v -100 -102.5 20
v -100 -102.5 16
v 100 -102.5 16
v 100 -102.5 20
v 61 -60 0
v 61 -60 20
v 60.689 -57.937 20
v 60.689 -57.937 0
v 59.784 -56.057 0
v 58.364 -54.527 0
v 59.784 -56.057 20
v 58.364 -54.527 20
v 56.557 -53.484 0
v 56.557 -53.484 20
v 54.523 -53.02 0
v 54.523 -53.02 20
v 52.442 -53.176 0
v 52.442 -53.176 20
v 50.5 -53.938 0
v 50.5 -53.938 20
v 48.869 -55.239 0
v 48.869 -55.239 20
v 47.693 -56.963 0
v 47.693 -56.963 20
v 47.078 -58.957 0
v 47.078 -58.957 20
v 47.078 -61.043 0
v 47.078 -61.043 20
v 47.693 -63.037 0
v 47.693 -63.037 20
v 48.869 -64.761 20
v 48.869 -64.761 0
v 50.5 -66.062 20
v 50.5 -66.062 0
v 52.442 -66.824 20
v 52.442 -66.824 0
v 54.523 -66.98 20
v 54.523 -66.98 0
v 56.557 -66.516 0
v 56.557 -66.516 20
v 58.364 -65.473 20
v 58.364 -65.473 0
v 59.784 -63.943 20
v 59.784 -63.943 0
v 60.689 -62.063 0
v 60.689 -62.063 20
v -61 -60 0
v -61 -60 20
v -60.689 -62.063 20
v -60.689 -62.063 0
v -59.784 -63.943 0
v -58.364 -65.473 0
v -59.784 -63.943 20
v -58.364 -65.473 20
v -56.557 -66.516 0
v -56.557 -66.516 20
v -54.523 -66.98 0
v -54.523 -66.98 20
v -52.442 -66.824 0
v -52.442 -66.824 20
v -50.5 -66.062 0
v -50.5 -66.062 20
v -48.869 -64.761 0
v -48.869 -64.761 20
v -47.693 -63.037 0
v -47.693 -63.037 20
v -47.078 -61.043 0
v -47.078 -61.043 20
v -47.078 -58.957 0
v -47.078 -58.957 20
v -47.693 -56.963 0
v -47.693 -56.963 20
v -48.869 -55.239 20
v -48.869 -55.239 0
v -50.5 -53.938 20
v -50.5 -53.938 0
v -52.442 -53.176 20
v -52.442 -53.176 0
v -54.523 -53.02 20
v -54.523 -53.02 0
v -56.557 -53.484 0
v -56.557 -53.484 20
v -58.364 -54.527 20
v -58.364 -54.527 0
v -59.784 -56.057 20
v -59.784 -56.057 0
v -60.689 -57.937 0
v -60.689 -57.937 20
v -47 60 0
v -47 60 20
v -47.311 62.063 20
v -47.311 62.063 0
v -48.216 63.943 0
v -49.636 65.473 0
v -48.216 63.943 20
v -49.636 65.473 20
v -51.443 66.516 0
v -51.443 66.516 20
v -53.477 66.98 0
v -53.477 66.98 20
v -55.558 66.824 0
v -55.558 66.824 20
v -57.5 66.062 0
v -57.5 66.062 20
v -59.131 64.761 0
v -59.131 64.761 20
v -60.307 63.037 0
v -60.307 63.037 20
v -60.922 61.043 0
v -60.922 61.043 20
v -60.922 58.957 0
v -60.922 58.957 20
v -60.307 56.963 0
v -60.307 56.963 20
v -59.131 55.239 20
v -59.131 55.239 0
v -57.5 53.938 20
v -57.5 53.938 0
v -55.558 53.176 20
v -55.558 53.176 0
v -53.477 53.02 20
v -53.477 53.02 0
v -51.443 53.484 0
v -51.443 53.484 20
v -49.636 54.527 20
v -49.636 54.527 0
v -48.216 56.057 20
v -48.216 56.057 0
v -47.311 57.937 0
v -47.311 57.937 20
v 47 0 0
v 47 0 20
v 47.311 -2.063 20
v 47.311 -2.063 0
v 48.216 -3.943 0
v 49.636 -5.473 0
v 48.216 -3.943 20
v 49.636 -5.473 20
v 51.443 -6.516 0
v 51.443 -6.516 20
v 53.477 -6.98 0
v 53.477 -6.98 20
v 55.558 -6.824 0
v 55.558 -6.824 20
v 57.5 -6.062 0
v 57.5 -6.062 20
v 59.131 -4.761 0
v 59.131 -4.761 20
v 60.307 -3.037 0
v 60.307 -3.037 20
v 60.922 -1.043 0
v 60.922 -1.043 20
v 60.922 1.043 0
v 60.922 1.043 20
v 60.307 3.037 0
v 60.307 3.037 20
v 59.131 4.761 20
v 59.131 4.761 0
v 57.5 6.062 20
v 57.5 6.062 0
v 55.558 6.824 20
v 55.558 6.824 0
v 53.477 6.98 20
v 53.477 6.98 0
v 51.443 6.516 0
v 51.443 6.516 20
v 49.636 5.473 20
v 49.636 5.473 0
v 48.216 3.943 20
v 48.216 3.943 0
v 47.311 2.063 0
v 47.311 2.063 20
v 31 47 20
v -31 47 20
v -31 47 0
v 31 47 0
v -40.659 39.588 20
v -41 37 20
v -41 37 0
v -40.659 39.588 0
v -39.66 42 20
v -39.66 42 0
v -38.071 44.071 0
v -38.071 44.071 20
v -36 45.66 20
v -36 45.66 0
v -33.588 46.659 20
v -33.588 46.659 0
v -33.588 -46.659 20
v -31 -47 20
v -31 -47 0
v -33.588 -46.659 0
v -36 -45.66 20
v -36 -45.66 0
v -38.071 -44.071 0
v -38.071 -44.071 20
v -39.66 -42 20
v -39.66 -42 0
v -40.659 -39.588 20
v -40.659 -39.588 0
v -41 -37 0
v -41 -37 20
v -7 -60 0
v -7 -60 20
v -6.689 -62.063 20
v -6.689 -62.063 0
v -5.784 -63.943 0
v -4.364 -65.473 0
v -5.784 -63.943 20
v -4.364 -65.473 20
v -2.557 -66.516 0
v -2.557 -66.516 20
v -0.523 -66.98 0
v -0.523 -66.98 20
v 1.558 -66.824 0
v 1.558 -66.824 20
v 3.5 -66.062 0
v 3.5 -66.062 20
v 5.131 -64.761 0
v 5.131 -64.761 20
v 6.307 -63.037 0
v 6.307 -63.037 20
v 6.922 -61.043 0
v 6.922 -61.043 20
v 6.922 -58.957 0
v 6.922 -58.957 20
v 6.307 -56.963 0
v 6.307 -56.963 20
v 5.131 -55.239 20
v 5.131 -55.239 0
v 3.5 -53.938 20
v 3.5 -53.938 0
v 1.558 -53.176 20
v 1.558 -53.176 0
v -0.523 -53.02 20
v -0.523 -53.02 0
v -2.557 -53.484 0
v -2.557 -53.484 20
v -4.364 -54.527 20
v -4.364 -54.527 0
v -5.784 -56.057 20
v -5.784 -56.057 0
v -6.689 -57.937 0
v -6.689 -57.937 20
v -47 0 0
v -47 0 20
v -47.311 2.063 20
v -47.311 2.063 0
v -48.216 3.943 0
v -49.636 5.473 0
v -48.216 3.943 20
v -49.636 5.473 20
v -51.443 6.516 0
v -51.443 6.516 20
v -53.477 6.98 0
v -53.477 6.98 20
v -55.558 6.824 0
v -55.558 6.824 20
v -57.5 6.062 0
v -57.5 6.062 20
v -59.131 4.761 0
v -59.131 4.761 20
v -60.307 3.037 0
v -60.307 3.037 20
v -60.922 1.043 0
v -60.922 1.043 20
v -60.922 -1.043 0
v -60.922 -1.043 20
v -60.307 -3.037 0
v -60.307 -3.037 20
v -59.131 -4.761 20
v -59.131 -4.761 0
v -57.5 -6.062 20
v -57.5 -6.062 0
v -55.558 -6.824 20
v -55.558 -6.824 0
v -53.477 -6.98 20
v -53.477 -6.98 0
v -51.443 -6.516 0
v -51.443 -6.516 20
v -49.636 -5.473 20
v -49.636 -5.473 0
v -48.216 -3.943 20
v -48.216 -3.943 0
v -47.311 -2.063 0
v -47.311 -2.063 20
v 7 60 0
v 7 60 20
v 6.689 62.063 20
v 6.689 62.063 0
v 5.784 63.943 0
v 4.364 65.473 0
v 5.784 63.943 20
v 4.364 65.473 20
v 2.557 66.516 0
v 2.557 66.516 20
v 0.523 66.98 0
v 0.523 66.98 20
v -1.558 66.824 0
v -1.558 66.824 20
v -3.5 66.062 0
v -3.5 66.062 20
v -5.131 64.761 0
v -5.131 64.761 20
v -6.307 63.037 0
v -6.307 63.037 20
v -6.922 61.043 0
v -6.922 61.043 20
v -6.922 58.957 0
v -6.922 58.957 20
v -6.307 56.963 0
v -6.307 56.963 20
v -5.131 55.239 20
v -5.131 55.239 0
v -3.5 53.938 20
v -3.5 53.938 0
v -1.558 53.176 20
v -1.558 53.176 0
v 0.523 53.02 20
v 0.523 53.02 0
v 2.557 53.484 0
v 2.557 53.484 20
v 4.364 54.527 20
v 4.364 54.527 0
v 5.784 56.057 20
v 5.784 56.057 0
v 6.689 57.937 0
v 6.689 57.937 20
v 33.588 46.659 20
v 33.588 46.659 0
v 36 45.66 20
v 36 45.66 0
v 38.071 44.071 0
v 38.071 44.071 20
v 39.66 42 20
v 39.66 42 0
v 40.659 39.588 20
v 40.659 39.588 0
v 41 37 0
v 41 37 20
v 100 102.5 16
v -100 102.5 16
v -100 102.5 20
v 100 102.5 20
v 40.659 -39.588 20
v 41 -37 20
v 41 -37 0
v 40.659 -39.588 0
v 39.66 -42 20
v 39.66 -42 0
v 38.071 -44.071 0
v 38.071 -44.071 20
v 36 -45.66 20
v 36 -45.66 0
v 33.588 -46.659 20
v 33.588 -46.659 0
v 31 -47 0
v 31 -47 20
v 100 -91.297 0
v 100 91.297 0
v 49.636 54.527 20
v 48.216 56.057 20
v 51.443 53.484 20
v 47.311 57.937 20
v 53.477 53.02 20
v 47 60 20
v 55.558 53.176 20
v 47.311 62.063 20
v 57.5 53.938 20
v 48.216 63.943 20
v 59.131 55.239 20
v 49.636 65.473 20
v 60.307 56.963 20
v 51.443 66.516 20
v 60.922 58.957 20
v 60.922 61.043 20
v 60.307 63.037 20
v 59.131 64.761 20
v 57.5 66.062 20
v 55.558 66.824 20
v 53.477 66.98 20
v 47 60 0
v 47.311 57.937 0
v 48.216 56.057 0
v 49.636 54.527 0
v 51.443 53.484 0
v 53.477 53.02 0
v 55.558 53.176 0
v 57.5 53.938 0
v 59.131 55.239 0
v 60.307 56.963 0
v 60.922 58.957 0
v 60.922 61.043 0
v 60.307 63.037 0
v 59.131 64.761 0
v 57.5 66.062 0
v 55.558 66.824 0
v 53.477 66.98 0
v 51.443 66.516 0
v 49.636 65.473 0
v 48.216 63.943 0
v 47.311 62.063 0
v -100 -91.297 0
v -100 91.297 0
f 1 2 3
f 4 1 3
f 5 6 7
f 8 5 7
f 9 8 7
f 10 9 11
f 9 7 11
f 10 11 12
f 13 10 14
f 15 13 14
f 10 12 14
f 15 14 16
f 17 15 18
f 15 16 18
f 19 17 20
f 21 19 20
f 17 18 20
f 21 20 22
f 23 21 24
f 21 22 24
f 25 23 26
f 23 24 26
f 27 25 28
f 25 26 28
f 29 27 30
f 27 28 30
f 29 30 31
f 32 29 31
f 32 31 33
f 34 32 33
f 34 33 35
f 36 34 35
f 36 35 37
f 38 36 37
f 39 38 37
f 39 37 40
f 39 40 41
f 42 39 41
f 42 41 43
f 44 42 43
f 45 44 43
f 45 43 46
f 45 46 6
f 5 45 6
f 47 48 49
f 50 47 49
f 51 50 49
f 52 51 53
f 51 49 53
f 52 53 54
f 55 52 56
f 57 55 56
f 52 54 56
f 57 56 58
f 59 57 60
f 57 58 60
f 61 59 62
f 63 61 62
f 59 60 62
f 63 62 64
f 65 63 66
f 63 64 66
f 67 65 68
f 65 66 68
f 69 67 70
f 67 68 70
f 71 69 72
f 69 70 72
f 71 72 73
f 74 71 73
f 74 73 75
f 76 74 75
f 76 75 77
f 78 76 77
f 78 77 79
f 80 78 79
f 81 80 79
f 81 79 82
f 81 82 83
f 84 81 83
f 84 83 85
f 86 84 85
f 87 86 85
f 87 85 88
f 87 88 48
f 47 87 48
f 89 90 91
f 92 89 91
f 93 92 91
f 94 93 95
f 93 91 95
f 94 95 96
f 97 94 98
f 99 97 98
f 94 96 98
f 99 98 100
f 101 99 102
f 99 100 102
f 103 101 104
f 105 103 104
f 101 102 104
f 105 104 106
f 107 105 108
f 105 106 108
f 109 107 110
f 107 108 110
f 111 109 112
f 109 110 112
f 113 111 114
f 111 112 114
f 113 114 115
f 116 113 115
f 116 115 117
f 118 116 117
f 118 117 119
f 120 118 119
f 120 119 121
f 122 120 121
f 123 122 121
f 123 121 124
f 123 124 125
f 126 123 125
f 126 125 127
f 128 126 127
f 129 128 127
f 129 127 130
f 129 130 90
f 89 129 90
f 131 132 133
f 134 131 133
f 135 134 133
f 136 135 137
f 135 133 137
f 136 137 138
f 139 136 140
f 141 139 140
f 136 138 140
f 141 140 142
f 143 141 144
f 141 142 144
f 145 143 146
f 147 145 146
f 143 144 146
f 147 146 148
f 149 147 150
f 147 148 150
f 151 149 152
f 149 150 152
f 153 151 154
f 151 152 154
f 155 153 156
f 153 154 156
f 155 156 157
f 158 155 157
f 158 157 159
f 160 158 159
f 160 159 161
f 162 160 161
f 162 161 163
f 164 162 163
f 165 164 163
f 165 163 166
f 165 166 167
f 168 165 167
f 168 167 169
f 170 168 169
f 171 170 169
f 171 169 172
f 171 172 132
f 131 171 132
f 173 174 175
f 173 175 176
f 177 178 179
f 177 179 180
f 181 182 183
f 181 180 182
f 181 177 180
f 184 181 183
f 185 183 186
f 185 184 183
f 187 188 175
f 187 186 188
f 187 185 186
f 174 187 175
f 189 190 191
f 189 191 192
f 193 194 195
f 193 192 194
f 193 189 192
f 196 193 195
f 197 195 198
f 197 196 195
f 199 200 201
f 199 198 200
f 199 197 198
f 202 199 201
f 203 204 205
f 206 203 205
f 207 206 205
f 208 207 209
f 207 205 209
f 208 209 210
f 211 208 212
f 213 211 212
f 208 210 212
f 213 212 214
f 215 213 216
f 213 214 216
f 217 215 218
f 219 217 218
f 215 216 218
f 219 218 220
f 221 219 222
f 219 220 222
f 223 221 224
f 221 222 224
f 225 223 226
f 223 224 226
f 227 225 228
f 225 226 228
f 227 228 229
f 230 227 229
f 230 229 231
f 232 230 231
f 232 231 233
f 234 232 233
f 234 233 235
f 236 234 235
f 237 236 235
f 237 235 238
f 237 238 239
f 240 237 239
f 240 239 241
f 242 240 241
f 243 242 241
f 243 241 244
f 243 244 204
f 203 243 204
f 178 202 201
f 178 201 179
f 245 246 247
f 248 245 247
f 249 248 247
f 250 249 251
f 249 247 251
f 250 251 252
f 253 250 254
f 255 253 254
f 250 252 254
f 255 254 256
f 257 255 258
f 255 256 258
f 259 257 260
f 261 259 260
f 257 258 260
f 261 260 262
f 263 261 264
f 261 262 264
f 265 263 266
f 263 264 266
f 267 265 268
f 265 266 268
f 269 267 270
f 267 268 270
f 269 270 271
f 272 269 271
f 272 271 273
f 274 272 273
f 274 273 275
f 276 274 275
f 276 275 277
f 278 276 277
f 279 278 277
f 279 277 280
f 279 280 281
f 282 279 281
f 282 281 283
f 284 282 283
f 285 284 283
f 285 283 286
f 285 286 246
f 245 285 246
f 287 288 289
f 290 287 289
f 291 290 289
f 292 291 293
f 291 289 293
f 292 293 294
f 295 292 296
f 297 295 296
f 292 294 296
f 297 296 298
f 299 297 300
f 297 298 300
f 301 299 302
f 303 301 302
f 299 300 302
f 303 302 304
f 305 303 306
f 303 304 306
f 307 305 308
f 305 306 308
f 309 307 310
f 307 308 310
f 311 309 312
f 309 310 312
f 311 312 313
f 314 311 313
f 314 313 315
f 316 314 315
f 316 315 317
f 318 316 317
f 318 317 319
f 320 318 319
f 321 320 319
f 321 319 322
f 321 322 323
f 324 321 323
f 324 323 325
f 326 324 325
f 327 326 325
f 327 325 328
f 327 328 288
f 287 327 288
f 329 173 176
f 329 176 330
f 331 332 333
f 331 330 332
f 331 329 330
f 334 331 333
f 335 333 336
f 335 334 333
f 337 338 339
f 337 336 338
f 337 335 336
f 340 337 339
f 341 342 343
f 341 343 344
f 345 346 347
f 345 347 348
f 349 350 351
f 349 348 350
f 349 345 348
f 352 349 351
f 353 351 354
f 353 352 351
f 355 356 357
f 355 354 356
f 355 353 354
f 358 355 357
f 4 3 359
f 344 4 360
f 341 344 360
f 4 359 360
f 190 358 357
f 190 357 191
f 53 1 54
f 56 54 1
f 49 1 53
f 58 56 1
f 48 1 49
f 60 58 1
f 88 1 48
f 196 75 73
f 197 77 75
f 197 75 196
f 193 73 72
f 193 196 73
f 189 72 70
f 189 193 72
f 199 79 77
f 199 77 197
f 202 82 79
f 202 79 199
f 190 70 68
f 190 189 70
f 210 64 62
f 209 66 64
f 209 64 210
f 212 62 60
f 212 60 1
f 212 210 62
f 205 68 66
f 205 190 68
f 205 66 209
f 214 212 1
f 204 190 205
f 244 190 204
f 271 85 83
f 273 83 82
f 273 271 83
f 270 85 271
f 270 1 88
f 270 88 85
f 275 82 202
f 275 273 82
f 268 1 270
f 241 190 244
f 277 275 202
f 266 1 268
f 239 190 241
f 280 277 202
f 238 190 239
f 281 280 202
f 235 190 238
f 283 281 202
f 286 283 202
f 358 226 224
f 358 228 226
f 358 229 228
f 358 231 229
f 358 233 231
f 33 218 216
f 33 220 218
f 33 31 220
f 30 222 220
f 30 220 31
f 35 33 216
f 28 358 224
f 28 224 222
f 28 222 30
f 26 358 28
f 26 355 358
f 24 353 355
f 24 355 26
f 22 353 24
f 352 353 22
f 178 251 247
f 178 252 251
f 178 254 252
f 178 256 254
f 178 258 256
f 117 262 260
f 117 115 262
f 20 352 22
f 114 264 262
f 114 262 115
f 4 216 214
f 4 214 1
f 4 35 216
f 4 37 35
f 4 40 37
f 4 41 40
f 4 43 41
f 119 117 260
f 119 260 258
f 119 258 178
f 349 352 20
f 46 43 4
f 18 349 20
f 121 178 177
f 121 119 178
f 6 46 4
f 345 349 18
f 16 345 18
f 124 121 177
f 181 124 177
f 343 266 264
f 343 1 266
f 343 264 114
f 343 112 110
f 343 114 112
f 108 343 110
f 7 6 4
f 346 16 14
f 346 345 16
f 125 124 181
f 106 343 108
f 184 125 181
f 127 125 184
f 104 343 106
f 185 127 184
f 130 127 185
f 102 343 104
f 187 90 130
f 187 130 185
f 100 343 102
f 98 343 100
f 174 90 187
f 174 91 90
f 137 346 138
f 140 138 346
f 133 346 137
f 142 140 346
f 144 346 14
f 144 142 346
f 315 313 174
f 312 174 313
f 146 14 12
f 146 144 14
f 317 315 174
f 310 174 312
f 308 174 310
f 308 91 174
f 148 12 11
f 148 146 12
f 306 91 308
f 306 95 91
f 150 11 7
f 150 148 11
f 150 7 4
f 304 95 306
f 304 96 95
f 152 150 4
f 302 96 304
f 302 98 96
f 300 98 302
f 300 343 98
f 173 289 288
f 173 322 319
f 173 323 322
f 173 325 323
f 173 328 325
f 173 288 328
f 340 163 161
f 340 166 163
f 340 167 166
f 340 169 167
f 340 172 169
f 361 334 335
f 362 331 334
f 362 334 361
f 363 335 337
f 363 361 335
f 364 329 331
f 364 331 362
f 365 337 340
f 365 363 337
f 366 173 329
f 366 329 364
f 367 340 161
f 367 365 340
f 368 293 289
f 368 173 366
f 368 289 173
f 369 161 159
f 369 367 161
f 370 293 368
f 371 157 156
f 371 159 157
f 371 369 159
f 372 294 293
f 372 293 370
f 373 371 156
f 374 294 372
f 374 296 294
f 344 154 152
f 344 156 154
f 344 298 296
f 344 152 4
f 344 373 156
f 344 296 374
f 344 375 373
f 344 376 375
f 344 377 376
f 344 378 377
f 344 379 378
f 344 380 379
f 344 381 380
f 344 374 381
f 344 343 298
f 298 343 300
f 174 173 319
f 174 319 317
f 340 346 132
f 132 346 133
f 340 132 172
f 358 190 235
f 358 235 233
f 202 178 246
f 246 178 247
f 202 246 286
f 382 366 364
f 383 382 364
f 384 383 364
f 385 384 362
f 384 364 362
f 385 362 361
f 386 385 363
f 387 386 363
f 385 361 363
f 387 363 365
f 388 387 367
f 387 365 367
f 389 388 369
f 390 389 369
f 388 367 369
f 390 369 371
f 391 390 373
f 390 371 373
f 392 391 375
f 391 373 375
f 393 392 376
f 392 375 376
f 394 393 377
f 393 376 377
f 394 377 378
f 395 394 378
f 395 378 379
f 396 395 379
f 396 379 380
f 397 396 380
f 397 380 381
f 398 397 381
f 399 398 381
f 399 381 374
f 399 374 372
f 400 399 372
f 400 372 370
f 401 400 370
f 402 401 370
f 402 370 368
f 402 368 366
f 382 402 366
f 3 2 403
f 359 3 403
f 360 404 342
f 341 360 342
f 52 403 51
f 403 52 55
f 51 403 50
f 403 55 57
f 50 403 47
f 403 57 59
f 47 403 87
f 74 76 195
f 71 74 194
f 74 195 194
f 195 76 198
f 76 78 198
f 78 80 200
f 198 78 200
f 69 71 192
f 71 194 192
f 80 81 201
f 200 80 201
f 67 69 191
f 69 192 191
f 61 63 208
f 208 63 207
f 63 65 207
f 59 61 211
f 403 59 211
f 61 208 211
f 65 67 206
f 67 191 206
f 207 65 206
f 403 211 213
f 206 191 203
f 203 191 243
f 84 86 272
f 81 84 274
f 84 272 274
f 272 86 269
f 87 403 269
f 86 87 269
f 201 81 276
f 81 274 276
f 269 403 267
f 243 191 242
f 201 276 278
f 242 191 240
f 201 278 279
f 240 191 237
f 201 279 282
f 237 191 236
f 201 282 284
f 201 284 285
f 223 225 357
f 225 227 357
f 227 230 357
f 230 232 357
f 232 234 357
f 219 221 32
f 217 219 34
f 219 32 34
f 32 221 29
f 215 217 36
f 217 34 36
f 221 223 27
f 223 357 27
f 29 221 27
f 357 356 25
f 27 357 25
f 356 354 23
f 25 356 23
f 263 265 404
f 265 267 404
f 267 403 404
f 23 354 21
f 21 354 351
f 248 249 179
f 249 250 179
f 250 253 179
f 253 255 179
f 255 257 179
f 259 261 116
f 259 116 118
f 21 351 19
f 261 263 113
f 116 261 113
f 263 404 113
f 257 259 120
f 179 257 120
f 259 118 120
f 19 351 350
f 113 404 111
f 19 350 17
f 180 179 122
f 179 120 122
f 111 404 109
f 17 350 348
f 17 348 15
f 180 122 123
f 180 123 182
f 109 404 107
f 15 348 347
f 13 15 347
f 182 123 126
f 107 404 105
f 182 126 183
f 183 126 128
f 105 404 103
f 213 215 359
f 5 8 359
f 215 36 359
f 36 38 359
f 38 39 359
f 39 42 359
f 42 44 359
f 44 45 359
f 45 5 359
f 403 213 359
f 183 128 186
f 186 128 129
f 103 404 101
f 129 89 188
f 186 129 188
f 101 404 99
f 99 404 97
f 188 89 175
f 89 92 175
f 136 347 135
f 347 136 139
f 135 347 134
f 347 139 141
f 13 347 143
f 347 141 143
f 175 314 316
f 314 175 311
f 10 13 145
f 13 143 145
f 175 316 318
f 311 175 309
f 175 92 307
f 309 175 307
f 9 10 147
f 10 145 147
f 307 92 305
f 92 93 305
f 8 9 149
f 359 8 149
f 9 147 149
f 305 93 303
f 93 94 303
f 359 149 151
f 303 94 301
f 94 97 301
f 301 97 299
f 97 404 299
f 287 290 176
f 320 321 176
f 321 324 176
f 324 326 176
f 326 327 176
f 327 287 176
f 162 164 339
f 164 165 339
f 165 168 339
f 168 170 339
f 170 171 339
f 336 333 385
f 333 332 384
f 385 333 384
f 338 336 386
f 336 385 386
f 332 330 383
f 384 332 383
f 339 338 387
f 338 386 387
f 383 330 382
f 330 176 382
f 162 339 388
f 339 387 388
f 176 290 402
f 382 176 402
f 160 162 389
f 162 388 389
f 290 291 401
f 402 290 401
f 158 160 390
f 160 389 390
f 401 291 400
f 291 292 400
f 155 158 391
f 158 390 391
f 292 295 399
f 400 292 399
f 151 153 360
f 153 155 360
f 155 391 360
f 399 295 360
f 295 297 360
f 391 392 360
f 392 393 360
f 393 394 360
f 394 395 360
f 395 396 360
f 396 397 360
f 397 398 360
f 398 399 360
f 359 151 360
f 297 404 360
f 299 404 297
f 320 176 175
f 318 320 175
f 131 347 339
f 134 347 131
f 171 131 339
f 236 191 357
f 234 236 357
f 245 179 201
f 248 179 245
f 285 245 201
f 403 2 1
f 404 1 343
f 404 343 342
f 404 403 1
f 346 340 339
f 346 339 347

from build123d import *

# Parameters (mm, degrees)
SKETCH_1_W          = 200
SKETCH_1_H          = 205
EXTRUDE_1_DEPTH     = 20
SKETCH_2_R          = 7
CUT_EXTRUDE_1_DEPTH = 145.589937409
CUT_EXTRUDE_2_DEPTH = 226.624134347


with BuildPart() as part:
    # 草图1 → 凸台-拉伸1 (new body)
    with BuildSketch(Plane.XY):
        Rectangle(SKETCH_1_W, SKETCH_1_H)
    extrude(amount=EXTRUDE_1_DEPTH)

    # 草图2 → 切除-拉伸1 (cut, through all)
    with BuildSketch(Plane.XY.offset(20)):
        with Locations((-54, 60)):
            Circle(SKETCH_2_R)
        with Locations((0, 60)):
            Circle(SKETCH_2_R)
        with Locations((-54, 0)):
            Circle(SKETCH_2_R)
        with Locations(Location((54, 0, 0), (0, 0, 180))):
            Circle(SKETCH_2_R)
        with Locations(Location((54, 60, 0), (0, 0, 180))):
            Circle(SKETCH_2_R)
        with Locations(Location((-54, -60, 0), (0, 0, 180))):
            Circle(SKETCH_2_R)
        with Locations(Location((0, -60, 0), (0, 0, 180))):
            Circle(SKETCH_2_R)
        with Locations((54, -60)):
            Circle(SKETCH_2_R)
        with BuildLine():
            Line((-31, 47), (31, 47))
            ThreePointArc((31, 47), (38.071067812, 44.071067812), (41, 37))
            Line((41, 37), (41, -37))
            ThreePointArc((41, -37), (38.071067812, -44.071067812), (31, -47))
            Line((31, -47), (-31, -47))
            ThreePointArc((-31, -47), (-38.071067812, -44.071067812), (-41, -37))
            Line((-41, -37), (-41, 37))
            ThreePointArc((-41, 37), (-38.071067812, 44.071067812), (-31, 47))
        make_face()
    extrude(amount=-CUT_EXTRUDE_1_DEPTH, mode=Mode.SUBTRACT)

    # 草图3 → 切除-拉伸2 (cut, through all)
    with BuildSketch(Plane.ZY.offset(100)):
        Polygon((0, 102.5), (0, 91.296679389), (16, 102.5), align=None)
        Polygon((0, -102.5), (16, -102.5), (0, -91.296679389), align=None)
    extrude(amount=-CUT_EXTRUDE_2_DEPTH, mode=Mode.SUBTRACT)


solid = part.part
